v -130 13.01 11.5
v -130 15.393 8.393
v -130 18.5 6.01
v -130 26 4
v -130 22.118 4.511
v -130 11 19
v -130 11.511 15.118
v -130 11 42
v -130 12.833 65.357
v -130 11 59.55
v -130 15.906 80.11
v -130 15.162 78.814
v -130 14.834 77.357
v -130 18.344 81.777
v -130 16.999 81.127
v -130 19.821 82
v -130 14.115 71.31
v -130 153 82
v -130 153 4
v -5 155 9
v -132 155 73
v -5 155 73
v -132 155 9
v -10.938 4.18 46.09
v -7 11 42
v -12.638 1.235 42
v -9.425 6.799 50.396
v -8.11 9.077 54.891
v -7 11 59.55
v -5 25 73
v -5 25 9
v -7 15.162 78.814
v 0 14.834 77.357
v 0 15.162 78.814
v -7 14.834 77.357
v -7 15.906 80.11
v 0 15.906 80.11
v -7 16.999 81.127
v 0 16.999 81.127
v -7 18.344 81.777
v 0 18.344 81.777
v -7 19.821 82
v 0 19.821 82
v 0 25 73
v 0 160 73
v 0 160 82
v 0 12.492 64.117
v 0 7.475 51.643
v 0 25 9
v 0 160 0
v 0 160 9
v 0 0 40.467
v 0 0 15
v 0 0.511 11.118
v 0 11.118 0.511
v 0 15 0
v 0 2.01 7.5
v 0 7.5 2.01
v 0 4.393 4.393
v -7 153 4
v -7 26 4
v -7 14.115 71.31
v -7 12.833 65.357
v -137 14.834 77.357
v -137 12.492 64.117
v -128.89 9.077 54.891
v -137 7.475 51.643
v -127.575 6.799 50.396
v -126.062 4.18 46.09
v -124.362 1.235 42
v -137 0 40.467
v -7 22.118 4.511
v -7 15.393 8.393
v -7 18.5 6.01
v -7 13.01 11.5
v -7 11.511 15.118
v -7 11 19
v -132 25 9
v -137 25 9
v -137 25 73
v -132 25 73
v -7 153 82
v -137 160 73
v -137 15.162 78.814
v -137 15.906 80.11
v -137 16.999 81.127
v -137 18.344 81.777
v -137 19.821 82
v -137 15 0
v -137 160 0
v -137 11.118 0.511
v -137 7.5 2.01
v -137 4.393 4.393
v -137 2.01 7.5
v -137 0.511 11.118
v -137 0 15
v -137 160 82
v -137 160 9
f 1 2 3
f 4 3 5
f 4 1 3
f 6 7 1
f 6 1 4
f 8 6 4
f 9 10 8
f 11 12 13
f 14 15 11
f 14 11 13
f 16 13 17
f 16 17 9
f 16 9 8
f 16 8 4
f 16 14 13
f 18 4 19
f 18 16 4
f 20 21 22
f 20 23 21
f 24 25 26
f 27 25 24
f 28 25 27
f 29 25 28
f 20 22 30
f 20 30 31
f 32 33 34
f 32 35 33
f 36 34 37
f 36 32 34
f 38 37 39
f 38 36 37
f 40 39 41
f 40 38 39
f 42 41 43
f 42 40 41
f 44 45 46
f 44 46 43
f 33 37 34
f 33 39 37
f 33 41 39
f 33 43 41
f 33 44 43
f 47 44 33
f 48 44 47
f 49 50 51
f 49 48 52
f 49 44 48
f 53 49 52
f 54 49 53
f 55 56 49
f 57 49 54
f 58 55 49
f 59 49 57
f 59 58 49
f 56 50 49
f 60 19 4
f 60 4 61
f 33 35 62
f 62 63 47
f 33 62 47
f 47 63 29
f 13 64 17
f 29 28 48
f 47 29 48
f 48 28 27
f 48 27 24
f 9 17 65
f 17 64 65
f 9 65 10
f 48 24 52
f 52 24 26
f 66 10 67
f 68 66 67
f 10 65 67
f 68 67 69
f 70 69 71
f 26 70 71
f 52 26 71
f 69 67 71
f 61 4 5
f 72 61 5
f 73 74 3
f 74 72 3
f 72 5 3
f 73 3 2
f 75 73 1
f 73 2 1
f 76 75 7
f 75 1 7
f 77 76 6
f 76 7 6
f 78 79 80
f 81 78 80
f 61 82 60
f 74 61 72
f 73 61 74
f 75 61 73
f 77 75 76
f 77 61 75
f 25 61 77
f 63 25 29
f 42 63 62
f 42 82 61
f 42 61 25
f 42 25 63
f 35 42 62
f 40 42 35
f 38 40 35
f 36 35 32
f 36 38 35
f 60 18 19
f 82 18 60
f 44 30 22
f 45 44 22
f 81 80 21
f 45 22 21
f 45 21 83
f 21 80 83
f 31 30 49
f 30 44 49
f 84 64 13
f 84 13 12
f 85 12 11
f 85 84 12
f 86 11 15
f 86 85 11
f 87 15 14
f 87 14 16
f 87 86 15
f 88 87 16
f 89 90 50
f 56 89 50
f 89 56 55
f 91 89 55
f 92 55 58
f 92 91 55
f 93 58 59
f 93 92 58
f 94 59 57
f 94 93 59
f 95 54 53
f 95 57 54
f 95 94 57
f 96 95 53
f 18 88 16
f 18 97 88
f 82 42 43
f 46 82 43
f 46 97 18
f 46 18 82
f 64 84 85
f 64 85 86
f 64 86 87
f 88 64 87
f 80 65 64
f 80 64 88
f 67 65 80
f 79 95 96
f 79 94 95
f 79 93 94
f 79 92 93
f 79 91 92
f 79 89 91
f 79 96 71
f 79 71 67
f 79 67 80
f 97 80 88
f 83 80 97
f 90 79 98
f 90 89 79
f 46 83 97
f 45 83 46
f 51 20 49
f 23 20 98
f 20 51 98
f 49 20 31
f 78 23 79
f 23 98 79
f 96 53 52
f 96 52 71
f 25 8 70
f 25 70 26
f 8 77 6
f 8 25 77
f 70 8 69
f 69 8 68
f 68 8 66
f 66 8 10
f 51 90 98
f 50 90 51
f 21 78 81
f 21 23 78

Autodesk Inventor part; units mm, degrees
ref_plane "YZ Plane" through (0, 0, 0) normal (1, 0, 0) x (0, 1, 0)
ref_plane "XZ Plane" through (0, 0, 0) normal (0, 1, 0) x (-1, 0, 0)
sketch "Sketch1" plane through (0, 0, 0) normal (0, 0, 1) x (1, 0, 0)
  line L0 (0, 0) -> (-137, 0)
  line L1 (-137, 0) -> (-137, 160)
  line L2 (-137, 160) -> (0, 160)
  line L3 (0, 160) -> (0, 0)
  dimension "d0" = 137
  dimension "d1" = 160
extrude "Extrusion1" add sketch "Sketch1" along normal blind 82
sketch "Sketch2" plane through (0, 0, 82) normal (0, 0, 1) x (1, 0, 0)
  line L0 (-7, 11) -> (-130, 11)
  line L1 (-130, 11) -> (-130, 153)
  line L2 (-130, 153) -> (-7, 153)
  line L3 (-7, 153) -> (-7, 11)
  line L4 (-137, 160) -> (-137, 0) projected
  line L5 (0, 0) -> (0, 160) projected
  line L6 (0, 160) -> (-137, 160) projected
  line L7 (-137, 0) -> (0, 0) projected
  dimension "d4" = 7
  dimension "d5" = 7
  dimension "d6" = 7
  dimension "d7" = 11
extrude "Extrusion2" cut sketch "Sketch2" against normal blind 78 contours L0 L1 L2 L3
sketch "Sketch3" plane through (0, 0, 82) normal (0, 0, 1) x (1, 0, 0)
  line L0 (-7, 11) -> (-130, 11) projected
  line L1 (-130, 11) -> (-123.6491, 0)
  line L2 (0, 0) -> (-137, 0) projected
  line L3 (-130, 11) -> (-117.2983, 11) construction
  line L4 (-7, 11) -> (-13.3509, 0)
  line L5 (-7, 11) -> (5.7017, 11) construction
  line L6 (-13.3509, 0) -> (-123.6491, 0)
  line L7 (-130, 11) -> (-7, 11)
  dimension "d10" = 60
  dimension "d11" = 120
extrude "Extrusion3" cut sketch "Sketch3" against normal blind 40
sketch "Sketch4" plane through (-137, 0, 0) normal (-1, 0, 0) x (0, 0, 1)
  line L0 (73, 160) -> (9, 160)
  line L1 (9, 160) -> (9, 25)
  line L2 (9, 25) -> (73, 25)
  line L3 (73, 25) -> (73, 160)
  line L4 (82, 160) -> (82, 0) projected
  line L5 (0, 0) -> (0, 160) projected
  line L6 (0, 160) -> (82, 160) projected
  line L7 (0, 0) -> (82, 0) projected
  dimension "d14" = 9
  dimension "d15" = 9
  dimension "d16" = 0
  dimension "d17" = 25
extrude "Extrusion4" cut sketch "Sketch4" against normal blind 5 contours L3 L2 L1 L0
ref_plane "Work Plane1" through (-68.5, 0, 0) normal (1, 0, 0) x (0, 0, -1)
mirror "Mirror1" about plane through (-68.5, 0, 0) normal (1, 0, 0) of "Extrusion4"
sketch "Sketch5" plane through (-137, 160, 0) normal (0, 1, 0) x (1, 0, 0)
  line L0 (137, -73) -> (132, -73) projected
  line L1 (5, -73) -> (5, -9) projected
  line L2 (132, -73) -> (5, -73)
  line L3 (5, -73) -> (5, -9)
  line L4 (5, -9) -> (132, -9)
  line L5 (132, -9) -> (132, -73)
  point P0 (137, 0)
extrude "Extrusion5" cut sketch "Sketch5" against normal blind 5
fillet "Fillet1" radius 15 1 edges at (-68.5, 11, 4)
fillet "Fillet2" radius 15 1 edges at (-68.5, 0, 0)
sketch "Sketch6" plane through (-137, 0, 82) normal (-1, 0, 0) x (0, 0, 1)
  circle A0 centre (0, -50) radius 65
  line L0 (-67, 0) -> (0, 0) projected
  line L1 (0, 160) -> (0, 0) projected
  point P0 (-82, 0)
  dimension "d24" = 130
  dimension "d25" = 50
  dimension "d26" = 0
extrude "Extrusion6" cut sketch "Sketch6" against normal through all
fillet "Fillet3" radius 5 2 edges at (-133.5, 15, 82) (-3.5, 15, 82)
properties part number "box"
